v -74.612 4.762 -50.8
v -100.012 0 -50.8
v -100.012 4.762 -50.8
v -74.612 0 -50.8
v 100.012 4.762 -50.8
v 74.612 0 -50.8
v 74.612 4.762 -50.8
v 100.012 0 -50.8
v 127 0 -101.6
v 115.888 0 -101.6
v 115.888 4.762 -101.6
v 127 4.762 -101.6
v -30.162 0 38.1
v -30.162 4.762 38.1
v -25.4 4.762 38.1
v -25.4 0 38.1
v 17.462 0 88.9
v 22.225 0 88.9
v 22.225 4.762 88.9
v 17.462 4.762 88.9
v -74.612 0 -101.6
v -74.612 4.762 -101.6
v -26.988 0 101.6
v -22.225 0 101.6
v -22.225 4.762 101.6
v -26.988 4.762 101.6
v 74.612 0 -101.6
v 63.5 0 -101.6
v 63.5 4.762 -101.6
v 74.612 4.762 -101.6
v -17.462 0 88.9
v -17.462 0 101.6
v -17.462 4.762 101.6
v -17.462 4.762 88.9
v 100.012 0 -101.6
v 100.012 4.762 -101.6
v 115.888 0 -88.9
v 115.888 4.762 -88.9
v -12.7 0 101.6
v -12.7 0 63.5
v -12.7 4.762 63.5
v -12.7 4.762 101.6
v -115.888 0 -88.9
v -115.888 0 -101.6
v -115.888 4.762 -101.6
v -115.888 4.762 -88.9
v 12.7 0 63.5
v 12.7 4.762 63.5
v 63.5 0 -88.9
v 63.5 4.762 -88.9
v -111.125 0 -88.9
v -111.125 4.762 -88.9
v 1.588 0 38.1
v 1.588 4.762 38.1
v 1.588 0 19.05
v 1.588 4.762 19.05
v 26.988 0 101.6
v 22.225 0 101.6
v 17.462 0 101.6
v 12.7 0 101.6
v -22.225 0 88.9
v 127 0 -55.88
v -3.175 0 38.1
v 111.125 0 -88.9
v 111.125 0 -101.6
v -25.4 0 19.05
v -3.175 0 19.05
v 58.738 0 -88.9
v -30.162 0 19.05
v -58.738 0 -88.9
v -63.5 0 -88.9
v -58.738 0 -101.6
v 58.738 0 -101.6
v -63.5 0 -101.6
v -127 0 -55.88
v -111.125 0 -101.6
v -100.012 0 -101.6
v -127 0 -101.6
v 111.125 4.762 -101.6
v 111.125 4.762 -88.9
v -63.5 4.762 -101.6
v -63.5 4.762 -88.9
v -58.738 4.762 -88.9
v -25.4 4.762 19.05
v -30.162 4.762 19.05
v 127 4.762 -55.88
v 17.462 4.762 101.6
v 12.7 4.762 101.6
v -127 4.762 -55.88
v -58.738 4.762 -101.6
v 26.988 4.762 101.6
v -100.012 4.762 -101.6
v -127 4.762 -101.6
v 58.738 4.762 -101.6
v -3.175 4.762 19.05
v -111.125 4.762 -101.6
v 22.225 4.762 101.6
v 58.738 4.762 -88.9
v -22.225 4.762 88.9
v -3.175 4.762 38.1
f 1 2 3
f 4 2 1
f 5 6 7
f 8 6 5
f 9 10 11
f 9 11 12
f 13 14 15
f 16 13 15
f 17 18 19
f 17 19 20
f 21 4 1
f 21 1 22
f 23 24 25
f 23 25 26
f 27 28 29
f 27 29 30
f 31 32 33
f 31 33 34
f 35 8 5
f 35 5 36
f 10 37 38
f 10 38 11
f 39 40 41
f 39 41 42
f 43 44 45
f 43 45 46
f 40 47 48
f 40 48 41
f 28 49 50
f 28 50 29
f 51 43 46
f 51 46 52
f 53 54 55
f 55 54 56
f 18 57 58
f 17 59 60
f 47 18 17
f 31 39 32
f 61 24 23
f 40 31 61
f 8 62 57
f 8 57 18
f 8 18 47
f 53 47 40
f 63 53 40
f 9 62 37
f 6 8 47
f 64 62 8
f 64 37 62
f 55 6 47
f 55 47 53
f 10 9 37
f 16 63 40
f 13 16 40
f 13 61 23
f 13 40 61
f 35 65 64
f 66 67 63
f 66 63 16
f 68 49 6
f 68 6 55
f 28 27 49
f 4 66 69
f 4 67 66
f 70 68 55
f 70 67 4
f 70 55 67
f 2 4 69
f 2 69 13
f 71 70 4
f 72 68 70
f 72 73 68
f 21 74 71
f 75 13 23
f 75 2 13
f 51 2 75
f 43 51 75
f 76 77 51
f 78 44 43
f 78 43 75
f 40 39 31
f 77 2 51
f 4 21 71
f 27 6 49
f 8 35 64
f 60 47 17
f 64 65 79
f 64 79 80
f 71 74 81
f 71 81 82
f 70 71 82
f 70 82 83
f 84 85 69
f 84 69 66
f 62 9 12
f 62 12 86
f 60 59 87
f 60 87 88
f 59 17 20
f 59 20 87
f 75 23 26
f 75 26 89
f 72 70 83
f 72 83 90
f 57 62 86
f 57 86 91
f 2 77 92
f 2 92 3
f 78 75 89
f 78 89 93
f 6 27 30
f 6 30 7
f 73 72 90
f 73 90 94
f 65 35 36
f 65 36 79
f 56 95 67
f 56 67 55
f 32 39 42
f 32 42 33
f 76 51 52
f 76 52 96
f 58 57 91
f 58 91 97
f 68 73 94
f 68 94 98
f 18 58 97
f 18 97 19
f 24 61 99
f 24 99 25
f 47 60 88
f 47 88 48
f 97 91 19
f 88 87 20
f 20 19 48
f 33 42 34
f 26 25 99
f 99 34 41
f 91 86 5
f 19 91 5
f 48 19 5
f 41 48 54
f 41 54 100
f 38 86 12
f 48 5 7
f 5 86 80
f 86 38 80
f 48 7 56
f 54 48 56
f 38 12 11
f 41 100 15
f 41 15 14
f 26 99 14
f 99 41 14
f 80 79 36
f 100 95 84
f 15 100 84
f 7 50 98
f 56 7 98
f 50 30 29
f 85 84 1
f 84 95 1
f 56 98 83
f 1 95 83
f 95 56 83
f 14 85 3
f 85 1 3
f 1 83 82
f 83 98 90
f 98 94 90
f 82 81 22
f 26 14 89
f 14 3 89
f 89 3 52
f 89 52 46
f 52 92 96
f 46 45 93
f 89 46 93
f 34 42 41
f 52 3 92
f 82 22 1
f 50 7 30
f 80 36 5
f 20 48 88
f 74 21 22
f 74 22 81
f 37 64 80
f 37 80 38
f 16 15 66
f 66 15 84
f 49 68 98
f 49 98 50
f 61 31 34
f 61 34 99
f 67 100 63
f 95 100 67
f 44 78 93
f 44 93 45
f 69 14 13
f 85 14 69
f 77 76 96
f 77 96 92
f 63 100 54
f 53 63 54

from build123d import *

# Parameters (mm, degrees)
BOSS_EXTRUDE1_DEPTH = 4.7625
SKETCH2_W           = 4.7625
SKETCH2_H           = 19.05
CUT_EXTRUDE1_DEPTH  = 163.709069834


with BuildPart() as part:
    # Sketch1 → Boss-Extrude1 (new body)
    with BuildSketch(Plane(origin=(0, 0, 0), x_dir=(1, 0, 0), z_dir=(0, 1, 0))):
        Polygon((12.7, -63.5), (-12.7, -63.5), (-12.7, -101.6), (-17.4625, -101.6), (-17.4625, -88.9), (-22.225, -88.9), (-22.225, -101.6), (-26.9875, -101.6), (-127, 55.88), (-127, 101.6), (-115.8875, 101.6), (-115.8875, 88.9), (-111.125, 88.9), (-111.125, 101.6), (-100.0125, 101.6), (-100.0125, 50.8), (-74.6125, 50.8), (-74.6125, 101.6), (-63.5, 101.6), (-63.5, 88.9), (-58.7375, 88.9), (-58.7375, 101.6), (58.7375, 101.6), (58.7375, 88.9), (63.5, 88.9), (63.5, 101.6), (74.6125, 101.6), (74.6125, 50.8), (100.0125, 50.8), (100.0125, 101.6), (111.125, 101.6), (111.125, 88.9), (115.8875, 88.9), (115.8875, 101.6), (127, 101.6), (127, 55.88), (26.9875, -101.6), (22.225, -101.6), (22.225, -88.9), (17.4625, -88.9), (17.4625, -101.6), (12.7, -101.6), align=None)
    extrude(amount=BOSS_EXTRUDE1_DEPTH)

    # Sketch2 → Cut-Extrude1 (cut, through all)
    with BuildSketch(Plane(origin=(0, 4.7625, 0), x_dir=(1, 0, 0), z_dir=(0, 1, 0))):
        with Locations((-27.78125, -28.575)):
            Rectangle(SKETCH2_W, SKETCH2_H)
        with Locations((-0.79375, -28.575)):
            Rectangle(SKETCH2_W, SKETCH2_H)
    extrude(amount=-CUT_EXTRUDE1_DEPTH, mode=Mode.SUBTRACT)


solid = part.part
